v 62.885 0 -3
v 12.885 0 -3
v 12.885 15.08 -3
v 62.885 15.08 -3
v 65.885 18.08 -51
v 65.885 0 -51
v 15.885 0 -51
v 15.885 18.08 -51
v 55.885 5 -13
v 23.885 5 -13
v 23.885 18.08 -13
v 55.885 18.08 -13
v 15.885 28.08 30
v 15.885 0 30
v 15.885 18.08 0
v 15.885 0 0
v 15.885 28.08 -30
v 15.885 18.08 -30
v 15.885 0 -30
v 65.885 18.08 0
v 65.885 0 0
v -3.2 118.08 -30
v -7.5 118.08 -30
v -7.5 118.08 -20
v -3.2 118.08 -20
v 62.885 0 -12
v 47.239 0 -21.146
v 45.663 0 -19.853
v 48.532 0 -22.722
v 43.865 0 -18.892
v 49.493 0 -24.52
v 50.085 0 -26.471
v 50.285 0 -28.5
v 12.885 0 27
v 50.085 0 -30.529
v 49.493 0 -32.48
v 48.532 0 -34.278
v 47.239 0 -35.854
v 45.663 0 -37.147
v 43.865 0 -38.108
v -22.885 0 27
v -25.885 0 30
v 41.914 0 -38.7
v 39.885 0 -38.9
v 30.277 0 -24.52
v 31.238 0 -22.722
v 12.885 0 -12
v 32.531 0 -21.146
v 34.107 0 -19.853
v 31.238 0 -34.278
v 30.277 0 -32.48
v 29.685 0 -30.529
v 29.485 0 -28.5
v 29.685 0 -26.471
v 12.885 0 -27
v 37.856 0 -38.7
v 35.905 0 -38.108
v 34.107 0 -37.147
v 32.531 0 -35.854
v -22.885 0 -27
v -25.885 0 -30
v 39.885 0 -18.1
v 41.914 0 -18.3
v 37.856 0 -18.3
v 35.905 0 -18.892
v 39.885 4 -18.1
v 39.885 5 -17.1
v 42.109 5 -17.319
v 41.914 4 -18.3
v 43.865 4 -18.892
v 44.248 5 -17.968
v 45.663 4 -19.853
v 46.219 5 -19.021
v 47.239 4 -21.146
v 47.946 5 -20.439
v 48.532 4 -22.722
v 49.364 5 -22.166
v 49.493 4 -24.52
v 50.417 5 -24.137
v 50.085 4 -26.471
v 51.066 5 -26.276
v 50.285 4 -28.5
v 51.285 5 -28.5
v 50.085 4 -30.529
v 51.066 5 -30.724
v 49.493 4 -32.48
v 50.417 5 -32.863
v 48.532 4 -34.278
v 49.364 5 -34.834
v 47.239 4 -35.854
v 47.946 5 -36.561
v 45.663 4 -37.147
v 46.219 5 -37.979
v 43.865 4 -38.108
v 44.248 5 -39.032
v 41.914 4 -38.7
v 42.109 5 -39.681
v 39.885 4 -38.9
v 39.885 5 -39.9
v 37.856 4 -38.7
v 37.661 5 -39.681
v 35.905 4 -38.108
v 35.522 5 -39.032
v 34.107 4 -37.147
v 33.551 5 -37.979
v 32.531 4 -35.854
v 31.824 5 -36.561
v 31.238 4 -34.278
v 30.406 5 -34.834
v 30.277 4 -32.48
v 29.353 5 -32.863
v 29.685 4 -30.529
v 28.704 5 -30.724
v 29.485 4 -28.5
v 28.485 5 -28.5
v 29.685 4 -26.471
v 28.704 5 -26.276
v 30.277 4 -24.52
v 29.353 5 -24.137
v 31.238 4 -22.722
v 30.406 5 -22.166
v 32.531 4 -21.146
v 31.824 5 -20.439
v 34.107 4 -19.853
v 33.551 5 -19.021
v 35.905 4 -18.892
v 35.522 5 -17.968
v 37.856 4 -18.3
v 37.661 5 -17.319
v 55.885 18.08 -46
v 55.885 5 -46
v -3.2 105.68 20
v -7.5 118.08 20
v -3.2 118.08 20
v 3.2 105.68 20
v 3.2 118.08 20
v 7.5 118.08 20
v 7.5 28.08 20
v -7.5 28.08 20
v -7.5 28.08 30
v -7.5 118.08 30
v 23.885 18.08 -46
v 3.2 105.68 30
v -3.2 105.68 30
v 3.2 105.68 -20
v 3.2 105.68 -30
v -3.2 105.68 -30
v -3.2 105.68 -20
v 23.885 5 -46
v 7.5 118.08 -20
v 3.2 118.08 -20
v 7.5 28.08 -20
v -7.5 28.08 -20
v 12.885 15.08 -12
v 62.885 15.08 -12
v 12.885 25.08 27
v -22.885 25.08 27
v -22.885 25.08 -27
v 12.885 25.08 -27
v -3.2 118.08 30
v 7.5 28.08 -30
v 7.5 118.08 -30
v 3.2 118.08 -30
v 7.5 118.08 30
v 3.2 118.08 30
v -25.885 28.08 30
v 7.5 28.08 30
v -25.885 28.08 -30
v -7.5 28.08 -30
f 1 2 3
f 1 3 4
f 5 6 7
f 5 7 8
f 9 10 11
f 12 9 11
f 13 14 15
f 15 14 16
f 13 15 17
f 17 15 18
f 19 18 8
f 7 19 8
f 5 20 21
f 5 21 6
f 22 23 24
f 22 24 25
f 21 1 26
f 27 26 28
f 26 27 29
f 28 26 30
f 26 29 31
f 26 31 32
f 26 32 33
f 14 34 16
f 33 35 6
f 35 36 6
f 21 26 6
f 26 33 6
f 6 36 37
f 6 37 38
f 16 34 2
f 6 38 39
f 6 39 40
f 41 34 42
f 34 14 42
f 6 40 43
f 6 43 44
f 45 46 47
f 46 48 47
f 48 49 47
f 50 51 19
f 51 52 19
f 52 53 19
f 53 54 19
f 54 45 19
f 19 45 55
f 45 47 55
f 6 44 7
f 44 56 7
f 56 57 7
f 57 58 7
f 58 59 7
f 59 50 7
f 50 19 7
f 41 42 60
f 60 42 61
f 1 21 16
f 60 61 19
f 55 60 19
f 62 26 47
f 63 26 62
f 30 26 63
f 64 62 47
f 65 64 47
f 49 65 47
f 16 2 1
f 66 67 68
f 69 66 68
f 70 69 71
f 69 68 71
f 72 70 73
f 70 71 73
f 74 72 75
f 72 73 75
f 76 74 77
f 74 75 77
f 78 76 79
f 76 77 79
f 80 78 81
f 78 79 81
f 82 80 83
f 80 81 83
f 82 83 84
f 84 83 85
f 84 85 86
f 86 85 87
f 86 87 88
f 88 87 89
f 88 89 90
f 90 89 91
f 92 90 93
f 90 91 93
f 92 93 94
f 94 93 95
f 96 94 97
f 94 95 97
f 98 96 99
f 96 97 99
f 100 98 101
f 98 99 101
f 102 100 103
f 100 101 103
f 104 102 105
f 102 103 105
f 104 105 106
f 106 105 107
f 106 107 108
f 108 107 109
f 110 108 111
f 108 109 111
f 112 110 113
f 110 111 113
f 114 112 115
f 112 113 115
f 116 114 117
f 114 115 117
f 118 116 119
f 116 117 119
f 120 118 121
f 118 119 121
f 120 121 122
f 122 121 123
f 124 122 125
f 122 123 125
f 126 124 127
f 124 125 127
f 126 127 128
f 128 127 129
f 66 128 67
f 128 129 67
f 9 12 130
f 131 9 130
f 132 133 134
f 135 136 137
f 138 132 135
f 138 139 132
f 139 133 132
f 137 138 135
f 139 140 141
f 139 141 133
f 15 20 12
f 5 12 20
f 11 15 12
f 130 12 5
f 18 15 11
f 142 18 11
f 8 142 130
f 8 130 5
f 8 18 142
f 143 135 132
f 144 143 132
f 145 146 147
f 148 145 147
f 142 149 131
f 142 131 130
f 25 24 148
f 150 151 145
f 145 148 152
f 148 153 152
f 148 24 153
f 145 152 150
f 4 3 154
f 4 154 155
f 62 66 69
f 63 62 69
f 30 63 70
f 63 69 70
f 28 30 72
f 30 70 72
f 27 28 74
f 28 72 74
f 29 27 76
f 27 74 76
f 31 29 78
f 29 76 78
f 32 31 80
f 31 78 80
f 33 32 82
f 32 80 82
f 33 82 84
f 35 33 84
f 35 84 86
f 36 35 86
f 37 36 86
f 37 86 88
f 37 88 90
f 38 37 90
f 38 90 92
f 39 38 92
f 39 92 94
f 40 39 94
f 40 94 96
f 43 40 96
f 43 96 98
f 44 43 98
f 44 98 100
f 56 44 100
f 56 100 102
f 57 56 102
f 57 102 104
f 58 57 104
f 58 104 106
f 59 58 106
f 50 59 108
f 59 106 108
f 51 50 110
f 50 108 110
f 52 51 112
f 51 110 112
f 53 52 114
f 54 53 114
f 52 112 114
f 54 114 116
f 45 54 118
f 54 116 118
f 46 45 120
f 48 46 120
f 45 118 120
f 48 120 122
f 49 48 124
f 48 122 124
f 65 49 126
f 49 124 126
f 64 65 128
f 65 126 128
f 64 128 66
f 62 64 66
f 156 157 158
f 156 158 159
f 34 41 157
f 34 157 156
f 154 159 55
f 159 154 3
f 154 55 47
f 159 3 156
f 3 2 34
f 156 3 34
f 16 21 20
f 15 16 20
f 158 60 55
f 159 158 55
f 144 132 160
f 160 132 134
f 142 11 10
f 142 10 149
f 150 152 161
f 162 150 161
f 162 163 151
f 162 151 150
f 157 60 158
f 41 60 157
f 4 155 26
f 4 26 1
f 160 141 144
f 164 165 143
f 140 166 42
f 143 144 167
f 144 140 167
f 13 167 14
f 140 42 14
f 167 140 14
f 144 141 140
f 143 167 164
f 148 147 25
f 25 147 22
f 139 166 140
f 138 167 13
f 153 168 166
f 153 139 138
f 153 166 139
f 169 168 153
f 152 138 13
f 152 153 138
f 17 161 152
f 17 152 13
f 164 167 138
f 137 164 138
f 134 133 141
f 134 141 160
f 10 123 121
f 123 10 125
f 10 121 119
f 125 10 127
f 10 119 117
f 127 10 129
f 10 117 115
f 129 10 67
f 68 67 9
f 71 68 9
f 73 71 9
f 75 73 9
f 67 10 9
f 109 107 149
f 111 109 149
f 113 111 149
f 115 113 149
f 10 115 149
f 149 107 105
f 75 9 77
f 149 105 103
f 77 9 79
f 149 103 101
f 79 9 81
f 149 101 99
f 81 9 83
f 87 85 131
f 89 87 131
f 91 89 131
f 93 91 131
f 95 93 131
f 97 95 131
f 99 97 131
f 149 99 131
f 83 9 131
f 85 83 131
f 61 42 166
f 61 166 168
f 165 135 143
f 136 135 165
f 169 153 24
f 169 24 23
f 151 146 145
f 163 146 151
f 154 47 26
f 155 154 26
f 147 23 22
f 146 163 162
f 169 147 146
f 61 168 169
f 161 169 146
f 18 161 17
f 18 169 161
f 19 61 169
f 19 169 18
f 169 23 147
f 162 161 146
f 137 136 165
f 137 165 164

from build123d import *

# Parameters (mm, degrees)
SKETCH2_W           = 41.77
SKETCH2_H           = 60
BOSS_EXTRUDE1_DEPTH = 28.08
SKETCH6_W           = 15
SKETCH6_H           = 10
BOSS_EXTRUDE4_DEPTH = 90
SKETCH7_W           = 6.4
SKETCH7_H           = 12.4
CUT_EXTRUDE1_DEPTH  = 135.955250454
SKETCH8_W           = 51
SKETCH8_H           = 18.08
BOSS_EXTRUDE5_DEPTH = 50
SKETCH9_W           = 33
SKETCH9_H           = 13.08
CUT_EXTRUDE2_DEPTH  = 32
SKETCH10_W          = 35.77
SKETCH10_H          = 54
CUT_EXTRUDE3_DEPTH  = 25.08
SKETCH11_W          = 50
SKETCH11_H          = 9
CUT_EXTRUDE4_DEPTH  = 15.08
SKETCH13_R          = 10.4
CUT_EXTRUDE5_DEPTH  = 10
CHAMFER1_SIZE       = 1


with BuildPart() as part:
    # Sketch2 → Boss-Extrude1 (new body)
    with BuildSketch(Plane(origin=(0, 0, 0), x_dir=(1, 0, 0), z_dir=(0, 1, 0))):
        with Locations((-5, 0)):
            Rectangle(SKETCH2_W, SKETCH2_H)
    extrude(amount=BOSS_EXTRUDE1_DEPTH)

    # Sketch6 → Boss-Extrude4 (add)
    with BuildSketch(Plane(origin=(0, 28.08, 0), x_dir=(1, 0, 0), z_dir=(0, 1, 0))):
        with Locations((0, -25)):
            Rectangle(SKETCH6_W, SKETCH6_H)
        with Locations((0, 25)):
            Rectangle(SKETCH6_W, SKETCH6_H)
    extrude(amount=BOSS_EXTRUDE4_DEPTH)

    # Sketch7 → Cut-Extrude1 (cut, through all)
    with BuildSketch(Plane(origin=(0, 0, -30), x_dir=(-1, 0, 0), z_dir=(0, 0, -1))):
        with Locations((0, 111.88)):
            Rectangle(SKETCH7_W, SKETCH7_H)
    extrude(amount=-CUT_EXTRUDE1_DEPTH, mode=Mode.SUBTRACT)

    # Sketch8 → Boss-Extrude5 (add)
    with BuildSketch(Plane(origin=(15.885, 0, 0), x_dir=(0, 0, -1), z_dir=(1, 0, 0))):
        with Locations((25.5, 9.04)):
            Rectangle(SKETCH8_W, SKETCH8_H)
    extrude(amount=BOSS_EXTRUDE5_DEPTH)

    # Sketch9 → Cut-Extrude2 (cut)
    with BuildSketch(Plane(origin=(55.885, 0, 0), x_dir=(0, 0, -1), z_dir=(1, 0, 0))):
        with Locations((29.5, 11.54)):
            Rectangle(SKETCH9_W, SKETCH9_H)
    extrude(amount=-CUT_EXTRUDE2_DEPTH, mode=Mode.SUBTRACT)

    # Sketch10 → Cut-Extrude3 (cut)
    with BuildSketch(Plane.XZ):
        with Locations((-5, 0)):
            Rectangle(SKETCH10_W, SKETCH10_H)
    extrude(amount=-CUT_EXTRUDE3_DEPTH, mode=Mode.SUBTRACT)

    # Sketch11 → Cut-Extrude4 (cut)
    with BuildSketch(Plane.XZ):
        with Locations((37.885, -7.5)):
            Rectangle(SKETCH11_W, SKETCH11_H)
    extrude(amount=-CUT_EXTRUDE4_DEPTH, mode=Mode.SUBTRACT)

    # Sketch13 → Cut-Extrude5 (cut)
    with BuildSketch(Plane(origin=(0, 5, 0), x_dir=(1, 0, 0), z_dir=(0, 1, 0))):
        with Locations(Location((39.885, 28.5, 0), (0, 0, 270))):
            Circle(SKETCH13_R)
    extrude(amount=-CUT_EXTRUDE5_DEPTH, mode=Mode.SUBTRACT)

    # Chamfer1
    chamfer1_edges = [part.edges().sort_by_distance(p)[0] for p in [
        (39.885, 5, -38.9),
    ]]
    chamfer(chamfer1_edges, length=CHAMFER1_SIZE)


solid = part.part
